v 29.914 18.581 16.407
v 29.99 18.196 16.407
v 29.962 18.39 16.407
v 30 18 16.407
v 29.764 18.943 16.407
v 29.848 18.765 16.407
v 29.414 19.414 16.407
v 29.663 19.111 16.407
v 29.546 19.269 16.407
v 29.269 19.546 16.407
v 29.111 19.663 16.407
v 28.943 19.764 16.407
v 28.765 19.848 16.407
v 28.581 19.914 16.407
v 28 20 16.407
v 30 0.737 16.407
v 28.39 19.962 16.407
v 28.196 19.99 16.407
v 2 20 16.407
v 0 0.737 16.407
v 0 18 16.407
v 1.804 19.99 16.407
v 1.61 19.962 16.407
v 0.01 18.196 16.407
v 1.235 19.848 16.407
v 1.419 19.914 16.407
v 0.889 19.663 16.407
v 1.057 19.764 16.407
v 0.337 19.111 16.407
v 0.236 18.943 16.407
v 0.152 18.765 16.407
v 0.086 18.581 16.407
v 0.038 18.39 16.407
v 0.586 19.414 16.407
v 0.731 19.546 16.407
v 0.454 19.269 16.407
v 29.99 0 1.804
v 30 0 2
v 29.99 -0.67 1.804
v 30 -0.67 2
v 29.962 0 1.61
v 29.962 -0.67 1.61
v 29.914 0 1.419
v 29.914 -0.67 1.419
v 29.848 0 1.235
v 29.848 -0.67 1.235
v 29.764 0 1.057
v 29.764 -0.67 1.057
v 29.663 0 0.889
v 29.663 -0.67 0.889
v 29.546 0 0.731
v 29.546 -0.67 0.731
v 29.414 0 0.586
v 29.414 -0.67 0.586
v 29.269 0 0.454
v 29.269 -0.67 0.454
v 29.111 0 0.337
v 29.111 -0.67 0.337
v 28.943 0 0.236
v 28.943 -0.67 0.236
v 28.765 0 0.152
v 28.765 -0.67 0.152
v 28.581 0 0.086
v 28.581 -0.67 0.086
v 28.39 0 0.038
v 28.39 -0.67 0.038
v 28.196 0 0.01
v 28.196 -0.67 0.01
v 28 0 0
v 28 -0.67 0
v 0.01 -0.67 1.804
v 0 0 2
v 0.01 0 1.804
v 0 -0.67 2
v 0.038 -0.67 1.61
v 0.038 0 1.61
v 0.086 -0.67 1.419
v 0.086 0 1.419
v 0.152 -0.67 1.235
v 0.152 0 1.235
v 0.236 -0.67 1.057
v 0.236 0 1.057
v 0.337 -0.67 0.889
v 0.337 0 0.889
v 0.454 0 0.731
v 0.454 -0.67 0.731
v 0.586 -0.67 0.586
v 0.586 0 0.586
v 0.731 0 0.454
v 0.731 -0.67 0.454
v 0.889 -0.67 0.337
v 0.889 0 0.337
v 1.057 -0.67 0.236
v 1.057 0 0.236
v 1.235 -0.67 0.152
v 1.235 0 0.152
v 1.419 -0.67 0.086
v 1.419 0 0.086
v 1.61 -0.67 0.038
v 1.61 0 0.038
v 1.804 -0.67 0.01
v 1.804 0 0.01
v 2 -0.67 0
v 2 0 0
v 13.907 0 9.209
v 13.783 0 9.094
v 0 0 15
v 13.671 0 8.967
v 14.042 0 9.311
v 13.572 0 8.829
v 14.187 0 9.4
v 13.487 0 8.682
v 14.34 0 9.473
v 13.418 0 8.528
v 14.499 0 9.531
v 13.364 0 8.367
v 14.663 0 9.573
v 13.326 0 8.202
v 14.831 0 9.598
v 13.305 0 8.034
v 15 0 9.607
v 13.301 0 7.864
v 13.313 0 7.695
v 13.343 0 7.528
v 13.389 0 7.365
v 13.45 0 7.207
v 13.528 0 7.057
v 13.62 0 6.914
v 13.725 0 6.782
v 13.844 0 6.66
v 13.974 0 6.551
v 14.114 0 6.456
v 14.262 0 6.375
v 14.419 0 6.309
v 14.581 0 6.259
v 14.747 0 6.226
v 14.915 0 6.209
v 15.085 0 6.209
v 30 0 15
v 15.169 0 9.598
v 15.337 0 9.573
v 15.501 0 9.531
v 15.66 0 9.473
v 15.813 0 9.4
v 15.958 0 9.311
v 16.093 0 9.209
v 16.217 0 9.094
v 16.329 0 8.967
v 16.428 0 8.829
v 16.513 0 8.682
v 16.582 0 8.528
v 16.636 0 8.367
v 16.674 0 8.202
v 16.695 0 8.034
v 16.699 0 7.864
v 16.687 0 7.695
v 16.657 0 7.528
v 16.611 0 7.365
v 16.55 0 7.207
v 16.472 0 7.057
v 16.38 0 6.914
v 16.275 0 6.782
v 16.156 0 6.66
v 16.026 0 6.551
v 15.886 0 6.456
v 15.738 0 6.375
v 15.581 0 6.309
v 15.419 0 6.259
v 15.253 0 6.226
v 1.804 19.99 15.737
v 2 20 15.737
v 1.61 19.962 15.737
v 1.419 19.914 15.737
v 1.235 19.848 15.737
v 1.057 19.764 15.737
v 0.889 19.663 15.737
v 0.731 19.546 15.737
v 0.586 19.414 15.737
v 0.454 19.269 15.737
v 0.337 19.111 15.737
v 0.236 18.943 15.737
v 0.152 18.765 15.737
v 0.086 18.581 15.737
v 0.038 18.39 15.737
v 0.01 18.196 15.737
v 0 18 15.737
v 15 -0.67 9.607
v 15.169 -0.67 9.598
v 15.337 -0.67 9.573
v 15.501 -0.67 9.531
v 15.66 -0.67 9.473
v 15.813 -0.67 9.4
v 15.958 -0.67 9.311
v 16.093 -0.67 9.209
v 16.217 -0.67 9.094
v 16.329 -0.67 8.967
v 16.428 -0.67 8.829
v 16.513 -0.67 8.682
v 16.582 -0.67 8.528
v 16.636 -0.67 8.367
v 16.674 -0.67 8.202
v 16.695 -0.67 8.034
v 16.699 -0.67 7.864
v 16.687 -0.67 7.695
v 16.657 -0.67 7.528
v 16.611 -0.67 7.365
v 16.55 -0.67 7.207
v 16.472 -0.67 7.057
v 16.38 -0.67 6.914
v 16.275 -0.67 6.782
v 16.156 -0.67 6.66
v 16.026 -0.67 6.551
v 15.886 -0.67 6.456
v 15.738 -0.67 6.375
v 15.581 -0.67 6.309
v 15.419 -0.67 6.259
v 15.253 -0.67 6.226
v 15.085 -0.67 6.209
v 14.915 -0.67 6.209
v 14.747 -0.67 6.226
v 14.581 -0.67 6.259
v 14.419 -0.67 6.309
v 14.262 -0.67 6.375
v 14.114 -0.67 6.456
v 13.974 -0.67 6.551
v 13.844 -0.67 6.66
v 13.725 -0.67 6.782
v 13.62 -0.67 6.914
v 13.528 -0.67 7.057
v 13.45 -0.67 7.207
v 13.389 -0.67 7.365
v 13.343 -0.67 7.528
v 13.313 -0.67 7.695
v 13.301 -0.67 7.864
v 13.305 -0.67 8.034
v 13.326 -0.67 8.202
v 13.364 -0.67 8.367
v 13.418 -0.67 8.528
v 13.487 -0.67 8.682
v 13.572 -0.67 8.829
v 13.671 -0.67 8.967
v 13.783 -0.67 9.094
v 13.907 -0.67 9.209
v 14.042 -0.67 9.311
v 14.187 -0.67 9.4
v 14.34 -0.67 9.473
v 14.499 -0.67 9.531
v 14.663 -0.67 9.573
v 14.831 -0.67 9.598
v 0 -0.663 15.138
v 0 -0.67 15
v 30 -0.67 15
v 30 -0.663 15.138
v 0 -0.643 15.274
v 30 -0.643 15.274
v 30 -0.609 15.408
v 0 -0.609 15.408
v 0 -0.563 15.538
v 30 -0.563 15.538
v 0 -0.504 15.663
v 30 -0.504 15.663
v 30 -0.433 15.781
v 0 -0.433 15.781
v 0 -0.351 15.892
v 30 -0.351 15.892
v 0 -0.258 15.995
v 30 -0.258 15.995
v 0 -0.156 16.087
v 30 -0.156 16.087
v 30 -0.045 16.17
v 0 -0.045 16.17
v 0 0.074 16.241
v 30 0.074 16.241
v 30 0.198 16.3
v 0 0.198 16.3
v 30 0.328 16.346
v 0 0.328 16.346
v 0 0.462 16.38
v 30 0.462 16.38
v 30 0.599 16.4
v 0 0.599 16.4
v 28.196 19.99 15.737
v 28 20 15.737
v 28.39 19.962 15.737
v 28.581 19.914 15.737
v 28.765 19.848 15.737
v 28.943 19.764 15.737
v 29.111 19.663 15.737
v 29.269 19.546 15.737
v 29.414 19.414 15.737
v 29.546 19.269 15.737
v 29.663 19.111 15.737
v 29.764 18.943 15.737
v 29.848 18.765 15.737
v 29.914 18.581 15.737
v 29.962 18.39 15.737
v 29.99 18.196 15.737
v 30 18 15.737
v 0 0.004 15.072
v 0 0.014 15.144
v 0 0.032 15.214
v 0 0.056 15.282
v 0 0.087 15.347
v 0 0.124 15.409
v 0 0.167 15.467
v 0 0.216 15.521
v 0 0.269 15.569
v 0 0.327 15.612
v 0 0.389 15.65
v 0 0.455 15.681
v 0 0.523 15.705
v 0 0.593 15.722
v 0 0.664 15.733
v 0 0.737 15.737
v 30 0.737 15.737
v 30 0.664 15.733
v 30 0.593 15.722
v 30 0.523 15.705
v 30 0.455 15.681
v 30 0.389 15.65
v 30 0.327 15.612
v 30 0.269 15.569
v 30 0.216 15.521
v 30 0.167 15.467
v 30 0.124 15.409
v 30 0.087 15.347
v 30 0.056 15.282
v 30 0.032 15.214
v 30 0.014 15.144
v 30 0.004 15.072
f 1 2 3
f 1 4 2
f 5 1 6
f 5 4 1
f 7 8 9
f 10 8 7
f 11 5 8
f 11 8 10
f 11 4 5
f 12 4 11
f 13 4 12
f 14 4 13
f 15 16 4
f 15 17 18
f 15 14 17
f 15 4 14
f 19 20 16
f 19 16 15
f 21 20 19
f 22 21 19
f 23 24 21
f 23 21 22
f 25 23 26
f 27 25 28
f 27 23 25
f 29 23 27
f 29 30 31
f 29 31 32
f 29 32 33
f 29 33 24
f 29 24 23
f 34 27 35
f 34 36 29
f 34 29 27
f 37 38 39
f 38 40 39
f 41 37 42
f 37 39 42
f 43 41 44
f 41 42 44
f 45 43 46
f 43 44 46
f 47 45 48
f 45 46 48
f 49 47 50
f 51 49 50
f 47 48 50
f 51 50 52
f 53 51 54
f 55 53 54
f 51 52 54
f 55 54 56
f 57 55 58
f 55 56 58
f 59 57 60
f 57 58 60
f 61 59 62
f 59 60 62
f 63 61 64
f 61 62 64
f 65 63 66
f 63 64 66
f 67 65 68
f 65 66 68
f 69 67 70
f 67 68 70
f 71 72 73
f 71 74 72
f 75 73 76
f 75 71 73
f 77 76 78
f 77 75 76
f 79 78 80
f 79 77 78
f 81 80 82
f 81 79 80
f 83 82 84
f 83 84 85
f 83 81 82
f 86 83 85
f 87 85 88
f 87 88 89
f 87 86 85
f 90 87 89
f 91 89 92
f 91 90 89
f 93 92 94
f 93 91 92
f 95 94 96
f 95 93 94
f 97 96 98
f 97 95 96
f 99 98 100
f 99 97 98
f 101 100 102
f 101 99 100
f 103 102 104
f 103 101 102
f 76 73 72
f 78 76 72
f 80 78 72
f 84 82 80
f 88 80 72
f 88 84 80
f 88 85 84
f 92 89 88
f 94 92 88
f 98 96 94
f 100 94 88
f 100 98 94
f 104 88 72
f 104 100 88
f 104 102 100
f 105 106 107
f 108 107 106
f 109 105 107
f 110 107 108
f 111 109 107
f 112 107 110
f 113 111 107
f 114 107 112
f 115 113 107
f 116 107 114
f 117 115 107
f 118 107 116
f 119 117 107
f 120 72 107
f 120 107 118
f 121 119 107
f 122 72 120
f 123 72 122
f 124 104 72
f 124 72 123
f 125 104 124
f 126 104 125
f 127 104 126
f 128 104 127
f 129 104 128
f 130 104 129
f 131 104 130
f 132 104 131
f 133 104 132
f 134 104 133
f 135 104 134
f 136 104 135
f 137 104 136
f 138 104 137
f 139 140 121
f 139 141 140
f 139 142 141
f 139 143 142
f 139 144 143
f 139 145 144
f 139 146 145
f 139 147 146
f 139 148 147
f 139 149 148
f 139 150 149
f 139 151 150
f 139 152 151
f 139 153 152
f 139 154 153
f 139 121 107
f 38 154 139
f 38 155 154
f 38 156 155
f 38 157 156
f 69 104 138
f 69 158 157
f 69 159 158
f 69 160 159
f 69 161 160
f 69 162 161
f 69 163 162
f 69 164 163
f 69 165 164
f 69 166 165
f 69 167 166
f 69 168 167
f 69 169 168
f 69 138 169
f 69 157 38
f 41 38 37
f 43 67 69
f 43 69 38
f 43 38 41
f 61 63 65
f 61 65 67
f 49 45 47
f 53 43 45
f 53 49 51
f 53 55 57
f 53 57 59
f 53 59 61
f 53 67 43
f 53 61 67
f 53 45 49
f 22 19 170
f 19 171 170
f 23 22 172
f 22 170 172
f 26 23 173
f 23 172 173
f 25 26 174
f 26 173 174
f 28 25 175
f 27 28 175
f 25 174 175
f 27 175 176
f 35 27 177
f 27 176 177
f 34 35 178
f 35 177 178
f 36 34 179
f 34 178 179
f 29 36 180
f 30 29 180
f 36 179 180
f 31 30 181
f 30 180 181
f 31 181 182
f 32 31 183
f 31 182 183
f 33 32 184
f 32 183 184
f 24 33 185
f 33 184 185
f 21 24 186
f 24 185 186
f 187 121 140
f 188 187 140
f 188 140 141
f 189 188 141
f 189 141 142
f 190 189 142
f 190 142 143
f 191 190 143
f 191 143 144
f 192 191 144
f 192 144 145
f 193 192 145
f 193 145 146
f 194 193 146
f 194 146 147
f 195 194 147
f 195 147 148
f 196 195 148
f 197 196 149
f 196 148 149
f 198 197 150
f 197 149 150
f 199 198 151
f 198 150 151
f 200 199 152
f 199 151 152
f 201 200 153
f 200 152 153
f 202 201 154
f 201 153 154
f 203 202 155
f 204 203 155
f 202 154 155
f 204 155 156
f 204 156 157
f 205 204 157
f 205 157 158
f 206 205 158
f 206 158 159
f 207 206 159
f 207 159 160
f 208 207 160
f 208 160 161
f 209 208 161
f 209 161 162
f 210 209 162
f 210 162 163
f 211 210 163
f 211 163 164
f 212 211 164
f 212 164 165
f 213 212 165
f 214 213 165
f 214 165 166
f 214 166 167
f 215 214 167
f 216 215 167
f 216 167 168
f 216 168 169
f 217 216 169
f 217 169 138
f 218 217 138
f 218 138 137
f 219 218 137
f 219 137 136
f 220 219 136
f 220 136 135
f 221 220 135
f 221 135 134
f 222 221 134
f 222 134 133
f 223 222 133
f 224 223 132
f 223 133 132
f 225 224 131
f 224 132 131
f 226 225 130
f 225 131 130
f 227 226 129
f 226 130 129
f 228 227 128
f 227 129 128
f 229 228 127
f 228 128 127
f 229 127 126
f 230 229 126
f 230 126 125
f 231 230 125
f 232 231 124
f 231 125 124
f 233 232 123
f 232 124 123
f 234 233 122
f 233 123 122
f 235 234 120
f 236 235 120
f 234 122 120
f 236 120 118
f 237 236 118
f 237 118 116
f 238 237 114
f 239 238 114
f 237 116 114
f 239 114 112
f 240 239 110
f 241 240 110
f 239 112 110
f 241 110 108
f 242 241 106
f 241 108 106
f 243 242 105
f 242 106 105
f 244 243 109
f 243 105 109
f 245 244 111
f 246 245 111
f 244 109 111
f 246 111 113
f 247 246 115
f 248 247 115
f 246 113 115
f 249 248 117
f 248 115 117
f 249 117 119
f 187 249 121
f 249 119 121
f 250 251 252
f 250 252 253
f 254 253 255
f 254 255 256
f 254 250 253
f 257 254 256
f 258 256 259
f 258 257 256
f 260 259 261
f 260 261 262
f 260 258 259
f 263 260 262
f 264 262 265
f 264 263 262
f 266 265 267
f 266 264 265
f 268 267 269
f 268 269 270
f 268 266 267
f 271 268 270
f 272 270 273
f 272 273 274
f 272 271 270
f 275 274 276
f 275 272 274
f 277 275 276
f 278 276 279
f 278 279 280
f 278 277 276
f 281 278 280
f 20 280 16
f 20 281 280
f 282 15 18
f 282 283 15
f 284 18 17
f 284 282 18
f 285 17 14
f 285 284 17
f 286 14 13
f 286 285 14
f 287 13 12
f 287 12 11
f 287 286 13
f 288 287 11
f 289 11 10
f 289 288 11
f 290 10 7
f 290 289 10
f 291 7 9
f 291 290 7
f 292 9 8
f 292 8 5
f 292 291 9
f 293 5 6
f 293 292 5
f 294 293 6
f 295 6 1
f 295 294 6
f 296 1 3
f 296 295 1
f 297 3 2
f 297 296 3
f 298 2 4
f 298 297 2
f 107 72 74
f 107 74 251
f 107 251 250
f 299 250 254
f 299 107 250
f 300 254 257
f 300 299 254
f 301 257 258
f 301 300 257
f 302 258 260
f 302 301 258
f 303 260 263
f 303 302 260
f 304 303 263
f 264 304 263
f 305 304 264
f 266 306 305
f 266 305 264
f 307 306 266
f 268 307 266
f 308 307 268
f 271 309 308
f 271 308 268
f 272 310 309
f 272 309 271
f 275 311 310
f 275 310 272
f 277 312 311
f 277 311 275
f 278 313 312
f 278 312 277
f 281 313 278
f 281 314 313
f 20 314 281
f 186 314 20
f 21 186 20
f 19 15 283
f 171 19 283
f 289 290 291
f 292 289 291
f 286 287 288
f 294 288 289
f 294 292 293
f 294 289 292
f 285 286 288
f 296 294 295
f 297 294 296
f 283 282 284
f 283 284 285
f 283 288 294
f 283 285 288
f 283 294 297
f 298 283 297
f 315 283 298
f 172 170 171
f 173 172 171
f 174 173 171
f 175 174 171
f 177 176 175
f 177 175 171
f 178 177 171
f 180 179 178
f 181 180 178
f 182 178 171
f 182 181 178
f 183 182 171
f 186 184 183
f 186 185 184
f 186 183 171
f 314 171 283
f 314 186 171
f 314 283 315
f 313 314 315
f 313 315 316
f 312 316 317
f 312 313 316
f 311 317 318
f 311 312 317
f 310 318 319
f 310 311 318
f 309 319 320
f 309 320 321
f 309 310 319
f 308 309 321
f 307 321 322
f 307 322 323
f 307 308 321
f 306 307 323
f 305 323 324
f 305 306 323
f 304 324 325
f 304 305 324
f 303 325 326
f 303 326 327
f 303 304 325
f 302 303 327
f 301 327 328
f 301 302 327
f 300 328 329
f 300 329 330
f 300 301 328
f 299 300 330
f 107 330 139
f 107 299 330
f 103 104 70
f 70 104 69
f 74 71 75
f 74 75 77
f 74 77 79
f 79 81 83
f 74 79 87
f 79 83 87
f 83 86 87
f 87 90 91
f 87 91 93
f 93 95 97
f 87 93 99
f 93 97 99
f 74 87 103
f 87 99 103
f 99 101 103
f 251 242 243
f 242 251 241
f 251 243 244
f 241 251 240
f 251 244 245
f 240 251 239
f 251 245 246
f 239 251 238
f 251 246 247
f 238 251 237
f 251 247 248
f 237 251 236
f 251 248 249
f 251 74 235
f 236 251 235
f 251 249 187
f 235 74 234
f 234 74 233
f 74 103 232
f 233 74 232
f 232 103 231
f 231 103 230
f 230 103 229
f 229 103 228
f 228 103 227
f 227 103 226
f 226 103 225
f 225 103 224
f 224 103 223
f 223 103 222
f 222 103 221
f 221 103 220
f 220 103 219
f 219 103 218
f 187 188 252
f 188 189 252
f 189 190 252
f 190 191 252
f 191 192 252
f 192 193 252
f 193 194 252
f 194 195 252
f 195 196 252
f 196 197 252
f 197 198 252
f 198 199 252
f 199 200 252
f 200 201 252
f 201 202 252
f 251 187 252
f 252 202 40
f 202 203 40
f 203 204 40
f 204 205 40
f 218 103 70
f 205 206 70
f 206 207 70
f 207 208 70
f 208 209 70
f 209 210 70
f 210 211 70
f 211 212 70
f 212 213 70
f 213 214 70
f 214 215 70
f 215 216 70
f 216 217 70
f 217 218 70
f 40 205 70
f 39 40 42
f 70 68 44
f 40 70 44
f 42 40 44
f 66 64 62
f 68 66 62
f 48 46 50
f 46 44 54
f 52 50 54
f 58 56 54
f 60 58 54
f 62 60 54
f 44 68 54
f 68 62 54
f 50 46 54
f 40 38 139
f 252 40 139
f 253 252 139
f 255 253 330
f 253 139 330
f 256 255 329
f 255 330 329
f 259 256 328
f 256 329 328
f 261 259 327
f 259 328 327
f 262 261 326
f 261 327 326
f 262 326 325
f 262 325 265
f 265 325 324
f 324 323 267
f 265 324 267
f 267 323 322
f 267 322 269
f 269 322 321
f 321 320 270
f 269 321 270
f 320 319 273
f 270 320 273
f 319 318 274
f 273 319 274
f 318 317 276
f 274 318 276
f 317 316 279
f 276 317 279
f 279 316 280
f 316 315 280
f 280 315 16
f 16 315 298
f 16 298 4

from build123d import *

# Parameters (mm, degrees)
SKETCH1_W          = 30
SKETCH1_H          = 15
BASE_FLANGE1_DEPTH = 0.67
EDGE_FLANGE1_DEPTH = 30
SKETCH7_R          = 1.7
CUT_EXTRUDE1_DEPTH = 10
FILLET1_R          = 2


# Sheet-metal steps are written as plain solids
with BuildPart() as part:
    # Sketch1 → Base-Flange1 (new body)
    with BuildSketch(Plane(origin=(0, 0, 0), x_dir=(1, 0, 0), z_dir=(0, 1, 0))):
        with Locations((15, -7.5)):
            Rectangle(SKETCH1_W, SKETCH1_H)
    extrude(amount=-BASE_FLANGE1_DEPTH)

    # Edge-Flange1 section (across the edge) → Edge-Flange1 (add)
    with BuildSketch(Plane(origin=(0, 0, 15.7366), x_dir=(0, 0, -1), z_dir=(1, 0, 0))):
        with BuildLine():
            Line((-0.67, 0.7366), (-0.67, 20))
            Line((-0.67, 20), (0, 20))
            Line((0, 20), (0, 0.7366))
            ThreePointArc((0, 0.7366), (0.215745145, 0.215745145), (0.7366, 0))
            Line((0.7366, 0), (0.7366, -0.67))
            ThreePointArc((0.7366, -0.67), (-0.258016398, -0.258016398), (-0.67, 0.7366))
        make_face()
    extrude(amount=EDGE_FLANGE1_DEPTH)

    # Sketch7 → Cut-Extrude1 (cut)
    with BuildSketch(Plane(origin=(0, 0, 0), x_dir=(1, 0, 0), z_dir=(0, 1, 0))):
        with Locations(Location((15, -7.9066, 0), (0, 0, 270))):
            Circle(SKETCH7_R)
    extrude(amount=-CUT_EXTRUDE1_DEPTH, mode=Mode.SUBTRACT)

    # Fillet1
    fillet1_edges = [part.edges().sort_by_distance(p)[0] for p in [
        (0, 20, 16.0716),
        (30, 20, 16.0716),
        (0, -0.335, 0),
        (30, -0.335, 0),
    ]]
    fillet(fillet1_edges, radius=FILLET1_R)


solid = part.part
